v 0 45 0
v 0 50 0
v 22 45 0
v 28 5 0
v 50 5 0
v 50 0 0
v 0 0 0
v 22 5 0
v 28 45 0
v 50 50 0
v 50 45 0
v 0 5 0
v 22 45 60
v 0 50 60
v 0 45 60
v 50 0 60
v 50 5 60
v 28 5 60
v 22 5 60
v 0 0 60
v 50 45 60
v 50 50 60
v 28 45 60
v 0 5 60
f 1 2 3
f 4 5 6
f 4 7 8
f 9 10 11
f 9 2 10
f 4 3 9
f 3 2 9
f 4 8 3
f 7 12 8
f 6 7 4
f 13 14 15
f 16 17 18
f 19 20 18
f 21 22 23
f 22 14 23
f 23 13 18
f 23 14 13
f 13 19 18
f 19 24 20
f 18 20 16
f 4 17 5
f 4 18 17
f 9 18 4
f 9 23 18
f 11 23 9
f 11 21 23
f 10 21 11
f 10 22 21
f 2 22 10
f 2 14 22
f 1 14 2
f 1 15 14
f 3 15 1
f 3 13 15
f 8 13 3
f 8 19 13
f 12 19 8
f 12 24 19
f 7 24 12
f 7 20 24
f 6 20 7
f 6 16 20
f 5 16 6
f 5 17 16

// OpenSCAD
$fn = 32;

// ----------------------------------------------------------------------
// Structural section: ibeam 50 x 50 mm
// ----------------------------------------------------------------------

// --- parameters (mm) ---
sec_w = 50;               // section width, X
sec_h = 50;               // section height, Y
flange_t = 5;             // flange thickness
web_t = 6;                // web thickness
plate_t = 60;             // cut length, Z (extrusion height)
fit_tol = 0.05;           // declared fit tolerance (prompt contract)
free_tol = 0.3;           // declared free tolerance (prompt contract)

profile = [[0, 0], [50, 0], [50, 5], [28, 5], [28, 45], [50, 45], [50, 50], [0, 50], [0, 45], [22, 45], [22, 5], [0, 5]];  // primary outline, 12 points, counter clockwise

// --- the one profile operation ---
linear_extrude(height = plate_t) polygon(points = profile);
